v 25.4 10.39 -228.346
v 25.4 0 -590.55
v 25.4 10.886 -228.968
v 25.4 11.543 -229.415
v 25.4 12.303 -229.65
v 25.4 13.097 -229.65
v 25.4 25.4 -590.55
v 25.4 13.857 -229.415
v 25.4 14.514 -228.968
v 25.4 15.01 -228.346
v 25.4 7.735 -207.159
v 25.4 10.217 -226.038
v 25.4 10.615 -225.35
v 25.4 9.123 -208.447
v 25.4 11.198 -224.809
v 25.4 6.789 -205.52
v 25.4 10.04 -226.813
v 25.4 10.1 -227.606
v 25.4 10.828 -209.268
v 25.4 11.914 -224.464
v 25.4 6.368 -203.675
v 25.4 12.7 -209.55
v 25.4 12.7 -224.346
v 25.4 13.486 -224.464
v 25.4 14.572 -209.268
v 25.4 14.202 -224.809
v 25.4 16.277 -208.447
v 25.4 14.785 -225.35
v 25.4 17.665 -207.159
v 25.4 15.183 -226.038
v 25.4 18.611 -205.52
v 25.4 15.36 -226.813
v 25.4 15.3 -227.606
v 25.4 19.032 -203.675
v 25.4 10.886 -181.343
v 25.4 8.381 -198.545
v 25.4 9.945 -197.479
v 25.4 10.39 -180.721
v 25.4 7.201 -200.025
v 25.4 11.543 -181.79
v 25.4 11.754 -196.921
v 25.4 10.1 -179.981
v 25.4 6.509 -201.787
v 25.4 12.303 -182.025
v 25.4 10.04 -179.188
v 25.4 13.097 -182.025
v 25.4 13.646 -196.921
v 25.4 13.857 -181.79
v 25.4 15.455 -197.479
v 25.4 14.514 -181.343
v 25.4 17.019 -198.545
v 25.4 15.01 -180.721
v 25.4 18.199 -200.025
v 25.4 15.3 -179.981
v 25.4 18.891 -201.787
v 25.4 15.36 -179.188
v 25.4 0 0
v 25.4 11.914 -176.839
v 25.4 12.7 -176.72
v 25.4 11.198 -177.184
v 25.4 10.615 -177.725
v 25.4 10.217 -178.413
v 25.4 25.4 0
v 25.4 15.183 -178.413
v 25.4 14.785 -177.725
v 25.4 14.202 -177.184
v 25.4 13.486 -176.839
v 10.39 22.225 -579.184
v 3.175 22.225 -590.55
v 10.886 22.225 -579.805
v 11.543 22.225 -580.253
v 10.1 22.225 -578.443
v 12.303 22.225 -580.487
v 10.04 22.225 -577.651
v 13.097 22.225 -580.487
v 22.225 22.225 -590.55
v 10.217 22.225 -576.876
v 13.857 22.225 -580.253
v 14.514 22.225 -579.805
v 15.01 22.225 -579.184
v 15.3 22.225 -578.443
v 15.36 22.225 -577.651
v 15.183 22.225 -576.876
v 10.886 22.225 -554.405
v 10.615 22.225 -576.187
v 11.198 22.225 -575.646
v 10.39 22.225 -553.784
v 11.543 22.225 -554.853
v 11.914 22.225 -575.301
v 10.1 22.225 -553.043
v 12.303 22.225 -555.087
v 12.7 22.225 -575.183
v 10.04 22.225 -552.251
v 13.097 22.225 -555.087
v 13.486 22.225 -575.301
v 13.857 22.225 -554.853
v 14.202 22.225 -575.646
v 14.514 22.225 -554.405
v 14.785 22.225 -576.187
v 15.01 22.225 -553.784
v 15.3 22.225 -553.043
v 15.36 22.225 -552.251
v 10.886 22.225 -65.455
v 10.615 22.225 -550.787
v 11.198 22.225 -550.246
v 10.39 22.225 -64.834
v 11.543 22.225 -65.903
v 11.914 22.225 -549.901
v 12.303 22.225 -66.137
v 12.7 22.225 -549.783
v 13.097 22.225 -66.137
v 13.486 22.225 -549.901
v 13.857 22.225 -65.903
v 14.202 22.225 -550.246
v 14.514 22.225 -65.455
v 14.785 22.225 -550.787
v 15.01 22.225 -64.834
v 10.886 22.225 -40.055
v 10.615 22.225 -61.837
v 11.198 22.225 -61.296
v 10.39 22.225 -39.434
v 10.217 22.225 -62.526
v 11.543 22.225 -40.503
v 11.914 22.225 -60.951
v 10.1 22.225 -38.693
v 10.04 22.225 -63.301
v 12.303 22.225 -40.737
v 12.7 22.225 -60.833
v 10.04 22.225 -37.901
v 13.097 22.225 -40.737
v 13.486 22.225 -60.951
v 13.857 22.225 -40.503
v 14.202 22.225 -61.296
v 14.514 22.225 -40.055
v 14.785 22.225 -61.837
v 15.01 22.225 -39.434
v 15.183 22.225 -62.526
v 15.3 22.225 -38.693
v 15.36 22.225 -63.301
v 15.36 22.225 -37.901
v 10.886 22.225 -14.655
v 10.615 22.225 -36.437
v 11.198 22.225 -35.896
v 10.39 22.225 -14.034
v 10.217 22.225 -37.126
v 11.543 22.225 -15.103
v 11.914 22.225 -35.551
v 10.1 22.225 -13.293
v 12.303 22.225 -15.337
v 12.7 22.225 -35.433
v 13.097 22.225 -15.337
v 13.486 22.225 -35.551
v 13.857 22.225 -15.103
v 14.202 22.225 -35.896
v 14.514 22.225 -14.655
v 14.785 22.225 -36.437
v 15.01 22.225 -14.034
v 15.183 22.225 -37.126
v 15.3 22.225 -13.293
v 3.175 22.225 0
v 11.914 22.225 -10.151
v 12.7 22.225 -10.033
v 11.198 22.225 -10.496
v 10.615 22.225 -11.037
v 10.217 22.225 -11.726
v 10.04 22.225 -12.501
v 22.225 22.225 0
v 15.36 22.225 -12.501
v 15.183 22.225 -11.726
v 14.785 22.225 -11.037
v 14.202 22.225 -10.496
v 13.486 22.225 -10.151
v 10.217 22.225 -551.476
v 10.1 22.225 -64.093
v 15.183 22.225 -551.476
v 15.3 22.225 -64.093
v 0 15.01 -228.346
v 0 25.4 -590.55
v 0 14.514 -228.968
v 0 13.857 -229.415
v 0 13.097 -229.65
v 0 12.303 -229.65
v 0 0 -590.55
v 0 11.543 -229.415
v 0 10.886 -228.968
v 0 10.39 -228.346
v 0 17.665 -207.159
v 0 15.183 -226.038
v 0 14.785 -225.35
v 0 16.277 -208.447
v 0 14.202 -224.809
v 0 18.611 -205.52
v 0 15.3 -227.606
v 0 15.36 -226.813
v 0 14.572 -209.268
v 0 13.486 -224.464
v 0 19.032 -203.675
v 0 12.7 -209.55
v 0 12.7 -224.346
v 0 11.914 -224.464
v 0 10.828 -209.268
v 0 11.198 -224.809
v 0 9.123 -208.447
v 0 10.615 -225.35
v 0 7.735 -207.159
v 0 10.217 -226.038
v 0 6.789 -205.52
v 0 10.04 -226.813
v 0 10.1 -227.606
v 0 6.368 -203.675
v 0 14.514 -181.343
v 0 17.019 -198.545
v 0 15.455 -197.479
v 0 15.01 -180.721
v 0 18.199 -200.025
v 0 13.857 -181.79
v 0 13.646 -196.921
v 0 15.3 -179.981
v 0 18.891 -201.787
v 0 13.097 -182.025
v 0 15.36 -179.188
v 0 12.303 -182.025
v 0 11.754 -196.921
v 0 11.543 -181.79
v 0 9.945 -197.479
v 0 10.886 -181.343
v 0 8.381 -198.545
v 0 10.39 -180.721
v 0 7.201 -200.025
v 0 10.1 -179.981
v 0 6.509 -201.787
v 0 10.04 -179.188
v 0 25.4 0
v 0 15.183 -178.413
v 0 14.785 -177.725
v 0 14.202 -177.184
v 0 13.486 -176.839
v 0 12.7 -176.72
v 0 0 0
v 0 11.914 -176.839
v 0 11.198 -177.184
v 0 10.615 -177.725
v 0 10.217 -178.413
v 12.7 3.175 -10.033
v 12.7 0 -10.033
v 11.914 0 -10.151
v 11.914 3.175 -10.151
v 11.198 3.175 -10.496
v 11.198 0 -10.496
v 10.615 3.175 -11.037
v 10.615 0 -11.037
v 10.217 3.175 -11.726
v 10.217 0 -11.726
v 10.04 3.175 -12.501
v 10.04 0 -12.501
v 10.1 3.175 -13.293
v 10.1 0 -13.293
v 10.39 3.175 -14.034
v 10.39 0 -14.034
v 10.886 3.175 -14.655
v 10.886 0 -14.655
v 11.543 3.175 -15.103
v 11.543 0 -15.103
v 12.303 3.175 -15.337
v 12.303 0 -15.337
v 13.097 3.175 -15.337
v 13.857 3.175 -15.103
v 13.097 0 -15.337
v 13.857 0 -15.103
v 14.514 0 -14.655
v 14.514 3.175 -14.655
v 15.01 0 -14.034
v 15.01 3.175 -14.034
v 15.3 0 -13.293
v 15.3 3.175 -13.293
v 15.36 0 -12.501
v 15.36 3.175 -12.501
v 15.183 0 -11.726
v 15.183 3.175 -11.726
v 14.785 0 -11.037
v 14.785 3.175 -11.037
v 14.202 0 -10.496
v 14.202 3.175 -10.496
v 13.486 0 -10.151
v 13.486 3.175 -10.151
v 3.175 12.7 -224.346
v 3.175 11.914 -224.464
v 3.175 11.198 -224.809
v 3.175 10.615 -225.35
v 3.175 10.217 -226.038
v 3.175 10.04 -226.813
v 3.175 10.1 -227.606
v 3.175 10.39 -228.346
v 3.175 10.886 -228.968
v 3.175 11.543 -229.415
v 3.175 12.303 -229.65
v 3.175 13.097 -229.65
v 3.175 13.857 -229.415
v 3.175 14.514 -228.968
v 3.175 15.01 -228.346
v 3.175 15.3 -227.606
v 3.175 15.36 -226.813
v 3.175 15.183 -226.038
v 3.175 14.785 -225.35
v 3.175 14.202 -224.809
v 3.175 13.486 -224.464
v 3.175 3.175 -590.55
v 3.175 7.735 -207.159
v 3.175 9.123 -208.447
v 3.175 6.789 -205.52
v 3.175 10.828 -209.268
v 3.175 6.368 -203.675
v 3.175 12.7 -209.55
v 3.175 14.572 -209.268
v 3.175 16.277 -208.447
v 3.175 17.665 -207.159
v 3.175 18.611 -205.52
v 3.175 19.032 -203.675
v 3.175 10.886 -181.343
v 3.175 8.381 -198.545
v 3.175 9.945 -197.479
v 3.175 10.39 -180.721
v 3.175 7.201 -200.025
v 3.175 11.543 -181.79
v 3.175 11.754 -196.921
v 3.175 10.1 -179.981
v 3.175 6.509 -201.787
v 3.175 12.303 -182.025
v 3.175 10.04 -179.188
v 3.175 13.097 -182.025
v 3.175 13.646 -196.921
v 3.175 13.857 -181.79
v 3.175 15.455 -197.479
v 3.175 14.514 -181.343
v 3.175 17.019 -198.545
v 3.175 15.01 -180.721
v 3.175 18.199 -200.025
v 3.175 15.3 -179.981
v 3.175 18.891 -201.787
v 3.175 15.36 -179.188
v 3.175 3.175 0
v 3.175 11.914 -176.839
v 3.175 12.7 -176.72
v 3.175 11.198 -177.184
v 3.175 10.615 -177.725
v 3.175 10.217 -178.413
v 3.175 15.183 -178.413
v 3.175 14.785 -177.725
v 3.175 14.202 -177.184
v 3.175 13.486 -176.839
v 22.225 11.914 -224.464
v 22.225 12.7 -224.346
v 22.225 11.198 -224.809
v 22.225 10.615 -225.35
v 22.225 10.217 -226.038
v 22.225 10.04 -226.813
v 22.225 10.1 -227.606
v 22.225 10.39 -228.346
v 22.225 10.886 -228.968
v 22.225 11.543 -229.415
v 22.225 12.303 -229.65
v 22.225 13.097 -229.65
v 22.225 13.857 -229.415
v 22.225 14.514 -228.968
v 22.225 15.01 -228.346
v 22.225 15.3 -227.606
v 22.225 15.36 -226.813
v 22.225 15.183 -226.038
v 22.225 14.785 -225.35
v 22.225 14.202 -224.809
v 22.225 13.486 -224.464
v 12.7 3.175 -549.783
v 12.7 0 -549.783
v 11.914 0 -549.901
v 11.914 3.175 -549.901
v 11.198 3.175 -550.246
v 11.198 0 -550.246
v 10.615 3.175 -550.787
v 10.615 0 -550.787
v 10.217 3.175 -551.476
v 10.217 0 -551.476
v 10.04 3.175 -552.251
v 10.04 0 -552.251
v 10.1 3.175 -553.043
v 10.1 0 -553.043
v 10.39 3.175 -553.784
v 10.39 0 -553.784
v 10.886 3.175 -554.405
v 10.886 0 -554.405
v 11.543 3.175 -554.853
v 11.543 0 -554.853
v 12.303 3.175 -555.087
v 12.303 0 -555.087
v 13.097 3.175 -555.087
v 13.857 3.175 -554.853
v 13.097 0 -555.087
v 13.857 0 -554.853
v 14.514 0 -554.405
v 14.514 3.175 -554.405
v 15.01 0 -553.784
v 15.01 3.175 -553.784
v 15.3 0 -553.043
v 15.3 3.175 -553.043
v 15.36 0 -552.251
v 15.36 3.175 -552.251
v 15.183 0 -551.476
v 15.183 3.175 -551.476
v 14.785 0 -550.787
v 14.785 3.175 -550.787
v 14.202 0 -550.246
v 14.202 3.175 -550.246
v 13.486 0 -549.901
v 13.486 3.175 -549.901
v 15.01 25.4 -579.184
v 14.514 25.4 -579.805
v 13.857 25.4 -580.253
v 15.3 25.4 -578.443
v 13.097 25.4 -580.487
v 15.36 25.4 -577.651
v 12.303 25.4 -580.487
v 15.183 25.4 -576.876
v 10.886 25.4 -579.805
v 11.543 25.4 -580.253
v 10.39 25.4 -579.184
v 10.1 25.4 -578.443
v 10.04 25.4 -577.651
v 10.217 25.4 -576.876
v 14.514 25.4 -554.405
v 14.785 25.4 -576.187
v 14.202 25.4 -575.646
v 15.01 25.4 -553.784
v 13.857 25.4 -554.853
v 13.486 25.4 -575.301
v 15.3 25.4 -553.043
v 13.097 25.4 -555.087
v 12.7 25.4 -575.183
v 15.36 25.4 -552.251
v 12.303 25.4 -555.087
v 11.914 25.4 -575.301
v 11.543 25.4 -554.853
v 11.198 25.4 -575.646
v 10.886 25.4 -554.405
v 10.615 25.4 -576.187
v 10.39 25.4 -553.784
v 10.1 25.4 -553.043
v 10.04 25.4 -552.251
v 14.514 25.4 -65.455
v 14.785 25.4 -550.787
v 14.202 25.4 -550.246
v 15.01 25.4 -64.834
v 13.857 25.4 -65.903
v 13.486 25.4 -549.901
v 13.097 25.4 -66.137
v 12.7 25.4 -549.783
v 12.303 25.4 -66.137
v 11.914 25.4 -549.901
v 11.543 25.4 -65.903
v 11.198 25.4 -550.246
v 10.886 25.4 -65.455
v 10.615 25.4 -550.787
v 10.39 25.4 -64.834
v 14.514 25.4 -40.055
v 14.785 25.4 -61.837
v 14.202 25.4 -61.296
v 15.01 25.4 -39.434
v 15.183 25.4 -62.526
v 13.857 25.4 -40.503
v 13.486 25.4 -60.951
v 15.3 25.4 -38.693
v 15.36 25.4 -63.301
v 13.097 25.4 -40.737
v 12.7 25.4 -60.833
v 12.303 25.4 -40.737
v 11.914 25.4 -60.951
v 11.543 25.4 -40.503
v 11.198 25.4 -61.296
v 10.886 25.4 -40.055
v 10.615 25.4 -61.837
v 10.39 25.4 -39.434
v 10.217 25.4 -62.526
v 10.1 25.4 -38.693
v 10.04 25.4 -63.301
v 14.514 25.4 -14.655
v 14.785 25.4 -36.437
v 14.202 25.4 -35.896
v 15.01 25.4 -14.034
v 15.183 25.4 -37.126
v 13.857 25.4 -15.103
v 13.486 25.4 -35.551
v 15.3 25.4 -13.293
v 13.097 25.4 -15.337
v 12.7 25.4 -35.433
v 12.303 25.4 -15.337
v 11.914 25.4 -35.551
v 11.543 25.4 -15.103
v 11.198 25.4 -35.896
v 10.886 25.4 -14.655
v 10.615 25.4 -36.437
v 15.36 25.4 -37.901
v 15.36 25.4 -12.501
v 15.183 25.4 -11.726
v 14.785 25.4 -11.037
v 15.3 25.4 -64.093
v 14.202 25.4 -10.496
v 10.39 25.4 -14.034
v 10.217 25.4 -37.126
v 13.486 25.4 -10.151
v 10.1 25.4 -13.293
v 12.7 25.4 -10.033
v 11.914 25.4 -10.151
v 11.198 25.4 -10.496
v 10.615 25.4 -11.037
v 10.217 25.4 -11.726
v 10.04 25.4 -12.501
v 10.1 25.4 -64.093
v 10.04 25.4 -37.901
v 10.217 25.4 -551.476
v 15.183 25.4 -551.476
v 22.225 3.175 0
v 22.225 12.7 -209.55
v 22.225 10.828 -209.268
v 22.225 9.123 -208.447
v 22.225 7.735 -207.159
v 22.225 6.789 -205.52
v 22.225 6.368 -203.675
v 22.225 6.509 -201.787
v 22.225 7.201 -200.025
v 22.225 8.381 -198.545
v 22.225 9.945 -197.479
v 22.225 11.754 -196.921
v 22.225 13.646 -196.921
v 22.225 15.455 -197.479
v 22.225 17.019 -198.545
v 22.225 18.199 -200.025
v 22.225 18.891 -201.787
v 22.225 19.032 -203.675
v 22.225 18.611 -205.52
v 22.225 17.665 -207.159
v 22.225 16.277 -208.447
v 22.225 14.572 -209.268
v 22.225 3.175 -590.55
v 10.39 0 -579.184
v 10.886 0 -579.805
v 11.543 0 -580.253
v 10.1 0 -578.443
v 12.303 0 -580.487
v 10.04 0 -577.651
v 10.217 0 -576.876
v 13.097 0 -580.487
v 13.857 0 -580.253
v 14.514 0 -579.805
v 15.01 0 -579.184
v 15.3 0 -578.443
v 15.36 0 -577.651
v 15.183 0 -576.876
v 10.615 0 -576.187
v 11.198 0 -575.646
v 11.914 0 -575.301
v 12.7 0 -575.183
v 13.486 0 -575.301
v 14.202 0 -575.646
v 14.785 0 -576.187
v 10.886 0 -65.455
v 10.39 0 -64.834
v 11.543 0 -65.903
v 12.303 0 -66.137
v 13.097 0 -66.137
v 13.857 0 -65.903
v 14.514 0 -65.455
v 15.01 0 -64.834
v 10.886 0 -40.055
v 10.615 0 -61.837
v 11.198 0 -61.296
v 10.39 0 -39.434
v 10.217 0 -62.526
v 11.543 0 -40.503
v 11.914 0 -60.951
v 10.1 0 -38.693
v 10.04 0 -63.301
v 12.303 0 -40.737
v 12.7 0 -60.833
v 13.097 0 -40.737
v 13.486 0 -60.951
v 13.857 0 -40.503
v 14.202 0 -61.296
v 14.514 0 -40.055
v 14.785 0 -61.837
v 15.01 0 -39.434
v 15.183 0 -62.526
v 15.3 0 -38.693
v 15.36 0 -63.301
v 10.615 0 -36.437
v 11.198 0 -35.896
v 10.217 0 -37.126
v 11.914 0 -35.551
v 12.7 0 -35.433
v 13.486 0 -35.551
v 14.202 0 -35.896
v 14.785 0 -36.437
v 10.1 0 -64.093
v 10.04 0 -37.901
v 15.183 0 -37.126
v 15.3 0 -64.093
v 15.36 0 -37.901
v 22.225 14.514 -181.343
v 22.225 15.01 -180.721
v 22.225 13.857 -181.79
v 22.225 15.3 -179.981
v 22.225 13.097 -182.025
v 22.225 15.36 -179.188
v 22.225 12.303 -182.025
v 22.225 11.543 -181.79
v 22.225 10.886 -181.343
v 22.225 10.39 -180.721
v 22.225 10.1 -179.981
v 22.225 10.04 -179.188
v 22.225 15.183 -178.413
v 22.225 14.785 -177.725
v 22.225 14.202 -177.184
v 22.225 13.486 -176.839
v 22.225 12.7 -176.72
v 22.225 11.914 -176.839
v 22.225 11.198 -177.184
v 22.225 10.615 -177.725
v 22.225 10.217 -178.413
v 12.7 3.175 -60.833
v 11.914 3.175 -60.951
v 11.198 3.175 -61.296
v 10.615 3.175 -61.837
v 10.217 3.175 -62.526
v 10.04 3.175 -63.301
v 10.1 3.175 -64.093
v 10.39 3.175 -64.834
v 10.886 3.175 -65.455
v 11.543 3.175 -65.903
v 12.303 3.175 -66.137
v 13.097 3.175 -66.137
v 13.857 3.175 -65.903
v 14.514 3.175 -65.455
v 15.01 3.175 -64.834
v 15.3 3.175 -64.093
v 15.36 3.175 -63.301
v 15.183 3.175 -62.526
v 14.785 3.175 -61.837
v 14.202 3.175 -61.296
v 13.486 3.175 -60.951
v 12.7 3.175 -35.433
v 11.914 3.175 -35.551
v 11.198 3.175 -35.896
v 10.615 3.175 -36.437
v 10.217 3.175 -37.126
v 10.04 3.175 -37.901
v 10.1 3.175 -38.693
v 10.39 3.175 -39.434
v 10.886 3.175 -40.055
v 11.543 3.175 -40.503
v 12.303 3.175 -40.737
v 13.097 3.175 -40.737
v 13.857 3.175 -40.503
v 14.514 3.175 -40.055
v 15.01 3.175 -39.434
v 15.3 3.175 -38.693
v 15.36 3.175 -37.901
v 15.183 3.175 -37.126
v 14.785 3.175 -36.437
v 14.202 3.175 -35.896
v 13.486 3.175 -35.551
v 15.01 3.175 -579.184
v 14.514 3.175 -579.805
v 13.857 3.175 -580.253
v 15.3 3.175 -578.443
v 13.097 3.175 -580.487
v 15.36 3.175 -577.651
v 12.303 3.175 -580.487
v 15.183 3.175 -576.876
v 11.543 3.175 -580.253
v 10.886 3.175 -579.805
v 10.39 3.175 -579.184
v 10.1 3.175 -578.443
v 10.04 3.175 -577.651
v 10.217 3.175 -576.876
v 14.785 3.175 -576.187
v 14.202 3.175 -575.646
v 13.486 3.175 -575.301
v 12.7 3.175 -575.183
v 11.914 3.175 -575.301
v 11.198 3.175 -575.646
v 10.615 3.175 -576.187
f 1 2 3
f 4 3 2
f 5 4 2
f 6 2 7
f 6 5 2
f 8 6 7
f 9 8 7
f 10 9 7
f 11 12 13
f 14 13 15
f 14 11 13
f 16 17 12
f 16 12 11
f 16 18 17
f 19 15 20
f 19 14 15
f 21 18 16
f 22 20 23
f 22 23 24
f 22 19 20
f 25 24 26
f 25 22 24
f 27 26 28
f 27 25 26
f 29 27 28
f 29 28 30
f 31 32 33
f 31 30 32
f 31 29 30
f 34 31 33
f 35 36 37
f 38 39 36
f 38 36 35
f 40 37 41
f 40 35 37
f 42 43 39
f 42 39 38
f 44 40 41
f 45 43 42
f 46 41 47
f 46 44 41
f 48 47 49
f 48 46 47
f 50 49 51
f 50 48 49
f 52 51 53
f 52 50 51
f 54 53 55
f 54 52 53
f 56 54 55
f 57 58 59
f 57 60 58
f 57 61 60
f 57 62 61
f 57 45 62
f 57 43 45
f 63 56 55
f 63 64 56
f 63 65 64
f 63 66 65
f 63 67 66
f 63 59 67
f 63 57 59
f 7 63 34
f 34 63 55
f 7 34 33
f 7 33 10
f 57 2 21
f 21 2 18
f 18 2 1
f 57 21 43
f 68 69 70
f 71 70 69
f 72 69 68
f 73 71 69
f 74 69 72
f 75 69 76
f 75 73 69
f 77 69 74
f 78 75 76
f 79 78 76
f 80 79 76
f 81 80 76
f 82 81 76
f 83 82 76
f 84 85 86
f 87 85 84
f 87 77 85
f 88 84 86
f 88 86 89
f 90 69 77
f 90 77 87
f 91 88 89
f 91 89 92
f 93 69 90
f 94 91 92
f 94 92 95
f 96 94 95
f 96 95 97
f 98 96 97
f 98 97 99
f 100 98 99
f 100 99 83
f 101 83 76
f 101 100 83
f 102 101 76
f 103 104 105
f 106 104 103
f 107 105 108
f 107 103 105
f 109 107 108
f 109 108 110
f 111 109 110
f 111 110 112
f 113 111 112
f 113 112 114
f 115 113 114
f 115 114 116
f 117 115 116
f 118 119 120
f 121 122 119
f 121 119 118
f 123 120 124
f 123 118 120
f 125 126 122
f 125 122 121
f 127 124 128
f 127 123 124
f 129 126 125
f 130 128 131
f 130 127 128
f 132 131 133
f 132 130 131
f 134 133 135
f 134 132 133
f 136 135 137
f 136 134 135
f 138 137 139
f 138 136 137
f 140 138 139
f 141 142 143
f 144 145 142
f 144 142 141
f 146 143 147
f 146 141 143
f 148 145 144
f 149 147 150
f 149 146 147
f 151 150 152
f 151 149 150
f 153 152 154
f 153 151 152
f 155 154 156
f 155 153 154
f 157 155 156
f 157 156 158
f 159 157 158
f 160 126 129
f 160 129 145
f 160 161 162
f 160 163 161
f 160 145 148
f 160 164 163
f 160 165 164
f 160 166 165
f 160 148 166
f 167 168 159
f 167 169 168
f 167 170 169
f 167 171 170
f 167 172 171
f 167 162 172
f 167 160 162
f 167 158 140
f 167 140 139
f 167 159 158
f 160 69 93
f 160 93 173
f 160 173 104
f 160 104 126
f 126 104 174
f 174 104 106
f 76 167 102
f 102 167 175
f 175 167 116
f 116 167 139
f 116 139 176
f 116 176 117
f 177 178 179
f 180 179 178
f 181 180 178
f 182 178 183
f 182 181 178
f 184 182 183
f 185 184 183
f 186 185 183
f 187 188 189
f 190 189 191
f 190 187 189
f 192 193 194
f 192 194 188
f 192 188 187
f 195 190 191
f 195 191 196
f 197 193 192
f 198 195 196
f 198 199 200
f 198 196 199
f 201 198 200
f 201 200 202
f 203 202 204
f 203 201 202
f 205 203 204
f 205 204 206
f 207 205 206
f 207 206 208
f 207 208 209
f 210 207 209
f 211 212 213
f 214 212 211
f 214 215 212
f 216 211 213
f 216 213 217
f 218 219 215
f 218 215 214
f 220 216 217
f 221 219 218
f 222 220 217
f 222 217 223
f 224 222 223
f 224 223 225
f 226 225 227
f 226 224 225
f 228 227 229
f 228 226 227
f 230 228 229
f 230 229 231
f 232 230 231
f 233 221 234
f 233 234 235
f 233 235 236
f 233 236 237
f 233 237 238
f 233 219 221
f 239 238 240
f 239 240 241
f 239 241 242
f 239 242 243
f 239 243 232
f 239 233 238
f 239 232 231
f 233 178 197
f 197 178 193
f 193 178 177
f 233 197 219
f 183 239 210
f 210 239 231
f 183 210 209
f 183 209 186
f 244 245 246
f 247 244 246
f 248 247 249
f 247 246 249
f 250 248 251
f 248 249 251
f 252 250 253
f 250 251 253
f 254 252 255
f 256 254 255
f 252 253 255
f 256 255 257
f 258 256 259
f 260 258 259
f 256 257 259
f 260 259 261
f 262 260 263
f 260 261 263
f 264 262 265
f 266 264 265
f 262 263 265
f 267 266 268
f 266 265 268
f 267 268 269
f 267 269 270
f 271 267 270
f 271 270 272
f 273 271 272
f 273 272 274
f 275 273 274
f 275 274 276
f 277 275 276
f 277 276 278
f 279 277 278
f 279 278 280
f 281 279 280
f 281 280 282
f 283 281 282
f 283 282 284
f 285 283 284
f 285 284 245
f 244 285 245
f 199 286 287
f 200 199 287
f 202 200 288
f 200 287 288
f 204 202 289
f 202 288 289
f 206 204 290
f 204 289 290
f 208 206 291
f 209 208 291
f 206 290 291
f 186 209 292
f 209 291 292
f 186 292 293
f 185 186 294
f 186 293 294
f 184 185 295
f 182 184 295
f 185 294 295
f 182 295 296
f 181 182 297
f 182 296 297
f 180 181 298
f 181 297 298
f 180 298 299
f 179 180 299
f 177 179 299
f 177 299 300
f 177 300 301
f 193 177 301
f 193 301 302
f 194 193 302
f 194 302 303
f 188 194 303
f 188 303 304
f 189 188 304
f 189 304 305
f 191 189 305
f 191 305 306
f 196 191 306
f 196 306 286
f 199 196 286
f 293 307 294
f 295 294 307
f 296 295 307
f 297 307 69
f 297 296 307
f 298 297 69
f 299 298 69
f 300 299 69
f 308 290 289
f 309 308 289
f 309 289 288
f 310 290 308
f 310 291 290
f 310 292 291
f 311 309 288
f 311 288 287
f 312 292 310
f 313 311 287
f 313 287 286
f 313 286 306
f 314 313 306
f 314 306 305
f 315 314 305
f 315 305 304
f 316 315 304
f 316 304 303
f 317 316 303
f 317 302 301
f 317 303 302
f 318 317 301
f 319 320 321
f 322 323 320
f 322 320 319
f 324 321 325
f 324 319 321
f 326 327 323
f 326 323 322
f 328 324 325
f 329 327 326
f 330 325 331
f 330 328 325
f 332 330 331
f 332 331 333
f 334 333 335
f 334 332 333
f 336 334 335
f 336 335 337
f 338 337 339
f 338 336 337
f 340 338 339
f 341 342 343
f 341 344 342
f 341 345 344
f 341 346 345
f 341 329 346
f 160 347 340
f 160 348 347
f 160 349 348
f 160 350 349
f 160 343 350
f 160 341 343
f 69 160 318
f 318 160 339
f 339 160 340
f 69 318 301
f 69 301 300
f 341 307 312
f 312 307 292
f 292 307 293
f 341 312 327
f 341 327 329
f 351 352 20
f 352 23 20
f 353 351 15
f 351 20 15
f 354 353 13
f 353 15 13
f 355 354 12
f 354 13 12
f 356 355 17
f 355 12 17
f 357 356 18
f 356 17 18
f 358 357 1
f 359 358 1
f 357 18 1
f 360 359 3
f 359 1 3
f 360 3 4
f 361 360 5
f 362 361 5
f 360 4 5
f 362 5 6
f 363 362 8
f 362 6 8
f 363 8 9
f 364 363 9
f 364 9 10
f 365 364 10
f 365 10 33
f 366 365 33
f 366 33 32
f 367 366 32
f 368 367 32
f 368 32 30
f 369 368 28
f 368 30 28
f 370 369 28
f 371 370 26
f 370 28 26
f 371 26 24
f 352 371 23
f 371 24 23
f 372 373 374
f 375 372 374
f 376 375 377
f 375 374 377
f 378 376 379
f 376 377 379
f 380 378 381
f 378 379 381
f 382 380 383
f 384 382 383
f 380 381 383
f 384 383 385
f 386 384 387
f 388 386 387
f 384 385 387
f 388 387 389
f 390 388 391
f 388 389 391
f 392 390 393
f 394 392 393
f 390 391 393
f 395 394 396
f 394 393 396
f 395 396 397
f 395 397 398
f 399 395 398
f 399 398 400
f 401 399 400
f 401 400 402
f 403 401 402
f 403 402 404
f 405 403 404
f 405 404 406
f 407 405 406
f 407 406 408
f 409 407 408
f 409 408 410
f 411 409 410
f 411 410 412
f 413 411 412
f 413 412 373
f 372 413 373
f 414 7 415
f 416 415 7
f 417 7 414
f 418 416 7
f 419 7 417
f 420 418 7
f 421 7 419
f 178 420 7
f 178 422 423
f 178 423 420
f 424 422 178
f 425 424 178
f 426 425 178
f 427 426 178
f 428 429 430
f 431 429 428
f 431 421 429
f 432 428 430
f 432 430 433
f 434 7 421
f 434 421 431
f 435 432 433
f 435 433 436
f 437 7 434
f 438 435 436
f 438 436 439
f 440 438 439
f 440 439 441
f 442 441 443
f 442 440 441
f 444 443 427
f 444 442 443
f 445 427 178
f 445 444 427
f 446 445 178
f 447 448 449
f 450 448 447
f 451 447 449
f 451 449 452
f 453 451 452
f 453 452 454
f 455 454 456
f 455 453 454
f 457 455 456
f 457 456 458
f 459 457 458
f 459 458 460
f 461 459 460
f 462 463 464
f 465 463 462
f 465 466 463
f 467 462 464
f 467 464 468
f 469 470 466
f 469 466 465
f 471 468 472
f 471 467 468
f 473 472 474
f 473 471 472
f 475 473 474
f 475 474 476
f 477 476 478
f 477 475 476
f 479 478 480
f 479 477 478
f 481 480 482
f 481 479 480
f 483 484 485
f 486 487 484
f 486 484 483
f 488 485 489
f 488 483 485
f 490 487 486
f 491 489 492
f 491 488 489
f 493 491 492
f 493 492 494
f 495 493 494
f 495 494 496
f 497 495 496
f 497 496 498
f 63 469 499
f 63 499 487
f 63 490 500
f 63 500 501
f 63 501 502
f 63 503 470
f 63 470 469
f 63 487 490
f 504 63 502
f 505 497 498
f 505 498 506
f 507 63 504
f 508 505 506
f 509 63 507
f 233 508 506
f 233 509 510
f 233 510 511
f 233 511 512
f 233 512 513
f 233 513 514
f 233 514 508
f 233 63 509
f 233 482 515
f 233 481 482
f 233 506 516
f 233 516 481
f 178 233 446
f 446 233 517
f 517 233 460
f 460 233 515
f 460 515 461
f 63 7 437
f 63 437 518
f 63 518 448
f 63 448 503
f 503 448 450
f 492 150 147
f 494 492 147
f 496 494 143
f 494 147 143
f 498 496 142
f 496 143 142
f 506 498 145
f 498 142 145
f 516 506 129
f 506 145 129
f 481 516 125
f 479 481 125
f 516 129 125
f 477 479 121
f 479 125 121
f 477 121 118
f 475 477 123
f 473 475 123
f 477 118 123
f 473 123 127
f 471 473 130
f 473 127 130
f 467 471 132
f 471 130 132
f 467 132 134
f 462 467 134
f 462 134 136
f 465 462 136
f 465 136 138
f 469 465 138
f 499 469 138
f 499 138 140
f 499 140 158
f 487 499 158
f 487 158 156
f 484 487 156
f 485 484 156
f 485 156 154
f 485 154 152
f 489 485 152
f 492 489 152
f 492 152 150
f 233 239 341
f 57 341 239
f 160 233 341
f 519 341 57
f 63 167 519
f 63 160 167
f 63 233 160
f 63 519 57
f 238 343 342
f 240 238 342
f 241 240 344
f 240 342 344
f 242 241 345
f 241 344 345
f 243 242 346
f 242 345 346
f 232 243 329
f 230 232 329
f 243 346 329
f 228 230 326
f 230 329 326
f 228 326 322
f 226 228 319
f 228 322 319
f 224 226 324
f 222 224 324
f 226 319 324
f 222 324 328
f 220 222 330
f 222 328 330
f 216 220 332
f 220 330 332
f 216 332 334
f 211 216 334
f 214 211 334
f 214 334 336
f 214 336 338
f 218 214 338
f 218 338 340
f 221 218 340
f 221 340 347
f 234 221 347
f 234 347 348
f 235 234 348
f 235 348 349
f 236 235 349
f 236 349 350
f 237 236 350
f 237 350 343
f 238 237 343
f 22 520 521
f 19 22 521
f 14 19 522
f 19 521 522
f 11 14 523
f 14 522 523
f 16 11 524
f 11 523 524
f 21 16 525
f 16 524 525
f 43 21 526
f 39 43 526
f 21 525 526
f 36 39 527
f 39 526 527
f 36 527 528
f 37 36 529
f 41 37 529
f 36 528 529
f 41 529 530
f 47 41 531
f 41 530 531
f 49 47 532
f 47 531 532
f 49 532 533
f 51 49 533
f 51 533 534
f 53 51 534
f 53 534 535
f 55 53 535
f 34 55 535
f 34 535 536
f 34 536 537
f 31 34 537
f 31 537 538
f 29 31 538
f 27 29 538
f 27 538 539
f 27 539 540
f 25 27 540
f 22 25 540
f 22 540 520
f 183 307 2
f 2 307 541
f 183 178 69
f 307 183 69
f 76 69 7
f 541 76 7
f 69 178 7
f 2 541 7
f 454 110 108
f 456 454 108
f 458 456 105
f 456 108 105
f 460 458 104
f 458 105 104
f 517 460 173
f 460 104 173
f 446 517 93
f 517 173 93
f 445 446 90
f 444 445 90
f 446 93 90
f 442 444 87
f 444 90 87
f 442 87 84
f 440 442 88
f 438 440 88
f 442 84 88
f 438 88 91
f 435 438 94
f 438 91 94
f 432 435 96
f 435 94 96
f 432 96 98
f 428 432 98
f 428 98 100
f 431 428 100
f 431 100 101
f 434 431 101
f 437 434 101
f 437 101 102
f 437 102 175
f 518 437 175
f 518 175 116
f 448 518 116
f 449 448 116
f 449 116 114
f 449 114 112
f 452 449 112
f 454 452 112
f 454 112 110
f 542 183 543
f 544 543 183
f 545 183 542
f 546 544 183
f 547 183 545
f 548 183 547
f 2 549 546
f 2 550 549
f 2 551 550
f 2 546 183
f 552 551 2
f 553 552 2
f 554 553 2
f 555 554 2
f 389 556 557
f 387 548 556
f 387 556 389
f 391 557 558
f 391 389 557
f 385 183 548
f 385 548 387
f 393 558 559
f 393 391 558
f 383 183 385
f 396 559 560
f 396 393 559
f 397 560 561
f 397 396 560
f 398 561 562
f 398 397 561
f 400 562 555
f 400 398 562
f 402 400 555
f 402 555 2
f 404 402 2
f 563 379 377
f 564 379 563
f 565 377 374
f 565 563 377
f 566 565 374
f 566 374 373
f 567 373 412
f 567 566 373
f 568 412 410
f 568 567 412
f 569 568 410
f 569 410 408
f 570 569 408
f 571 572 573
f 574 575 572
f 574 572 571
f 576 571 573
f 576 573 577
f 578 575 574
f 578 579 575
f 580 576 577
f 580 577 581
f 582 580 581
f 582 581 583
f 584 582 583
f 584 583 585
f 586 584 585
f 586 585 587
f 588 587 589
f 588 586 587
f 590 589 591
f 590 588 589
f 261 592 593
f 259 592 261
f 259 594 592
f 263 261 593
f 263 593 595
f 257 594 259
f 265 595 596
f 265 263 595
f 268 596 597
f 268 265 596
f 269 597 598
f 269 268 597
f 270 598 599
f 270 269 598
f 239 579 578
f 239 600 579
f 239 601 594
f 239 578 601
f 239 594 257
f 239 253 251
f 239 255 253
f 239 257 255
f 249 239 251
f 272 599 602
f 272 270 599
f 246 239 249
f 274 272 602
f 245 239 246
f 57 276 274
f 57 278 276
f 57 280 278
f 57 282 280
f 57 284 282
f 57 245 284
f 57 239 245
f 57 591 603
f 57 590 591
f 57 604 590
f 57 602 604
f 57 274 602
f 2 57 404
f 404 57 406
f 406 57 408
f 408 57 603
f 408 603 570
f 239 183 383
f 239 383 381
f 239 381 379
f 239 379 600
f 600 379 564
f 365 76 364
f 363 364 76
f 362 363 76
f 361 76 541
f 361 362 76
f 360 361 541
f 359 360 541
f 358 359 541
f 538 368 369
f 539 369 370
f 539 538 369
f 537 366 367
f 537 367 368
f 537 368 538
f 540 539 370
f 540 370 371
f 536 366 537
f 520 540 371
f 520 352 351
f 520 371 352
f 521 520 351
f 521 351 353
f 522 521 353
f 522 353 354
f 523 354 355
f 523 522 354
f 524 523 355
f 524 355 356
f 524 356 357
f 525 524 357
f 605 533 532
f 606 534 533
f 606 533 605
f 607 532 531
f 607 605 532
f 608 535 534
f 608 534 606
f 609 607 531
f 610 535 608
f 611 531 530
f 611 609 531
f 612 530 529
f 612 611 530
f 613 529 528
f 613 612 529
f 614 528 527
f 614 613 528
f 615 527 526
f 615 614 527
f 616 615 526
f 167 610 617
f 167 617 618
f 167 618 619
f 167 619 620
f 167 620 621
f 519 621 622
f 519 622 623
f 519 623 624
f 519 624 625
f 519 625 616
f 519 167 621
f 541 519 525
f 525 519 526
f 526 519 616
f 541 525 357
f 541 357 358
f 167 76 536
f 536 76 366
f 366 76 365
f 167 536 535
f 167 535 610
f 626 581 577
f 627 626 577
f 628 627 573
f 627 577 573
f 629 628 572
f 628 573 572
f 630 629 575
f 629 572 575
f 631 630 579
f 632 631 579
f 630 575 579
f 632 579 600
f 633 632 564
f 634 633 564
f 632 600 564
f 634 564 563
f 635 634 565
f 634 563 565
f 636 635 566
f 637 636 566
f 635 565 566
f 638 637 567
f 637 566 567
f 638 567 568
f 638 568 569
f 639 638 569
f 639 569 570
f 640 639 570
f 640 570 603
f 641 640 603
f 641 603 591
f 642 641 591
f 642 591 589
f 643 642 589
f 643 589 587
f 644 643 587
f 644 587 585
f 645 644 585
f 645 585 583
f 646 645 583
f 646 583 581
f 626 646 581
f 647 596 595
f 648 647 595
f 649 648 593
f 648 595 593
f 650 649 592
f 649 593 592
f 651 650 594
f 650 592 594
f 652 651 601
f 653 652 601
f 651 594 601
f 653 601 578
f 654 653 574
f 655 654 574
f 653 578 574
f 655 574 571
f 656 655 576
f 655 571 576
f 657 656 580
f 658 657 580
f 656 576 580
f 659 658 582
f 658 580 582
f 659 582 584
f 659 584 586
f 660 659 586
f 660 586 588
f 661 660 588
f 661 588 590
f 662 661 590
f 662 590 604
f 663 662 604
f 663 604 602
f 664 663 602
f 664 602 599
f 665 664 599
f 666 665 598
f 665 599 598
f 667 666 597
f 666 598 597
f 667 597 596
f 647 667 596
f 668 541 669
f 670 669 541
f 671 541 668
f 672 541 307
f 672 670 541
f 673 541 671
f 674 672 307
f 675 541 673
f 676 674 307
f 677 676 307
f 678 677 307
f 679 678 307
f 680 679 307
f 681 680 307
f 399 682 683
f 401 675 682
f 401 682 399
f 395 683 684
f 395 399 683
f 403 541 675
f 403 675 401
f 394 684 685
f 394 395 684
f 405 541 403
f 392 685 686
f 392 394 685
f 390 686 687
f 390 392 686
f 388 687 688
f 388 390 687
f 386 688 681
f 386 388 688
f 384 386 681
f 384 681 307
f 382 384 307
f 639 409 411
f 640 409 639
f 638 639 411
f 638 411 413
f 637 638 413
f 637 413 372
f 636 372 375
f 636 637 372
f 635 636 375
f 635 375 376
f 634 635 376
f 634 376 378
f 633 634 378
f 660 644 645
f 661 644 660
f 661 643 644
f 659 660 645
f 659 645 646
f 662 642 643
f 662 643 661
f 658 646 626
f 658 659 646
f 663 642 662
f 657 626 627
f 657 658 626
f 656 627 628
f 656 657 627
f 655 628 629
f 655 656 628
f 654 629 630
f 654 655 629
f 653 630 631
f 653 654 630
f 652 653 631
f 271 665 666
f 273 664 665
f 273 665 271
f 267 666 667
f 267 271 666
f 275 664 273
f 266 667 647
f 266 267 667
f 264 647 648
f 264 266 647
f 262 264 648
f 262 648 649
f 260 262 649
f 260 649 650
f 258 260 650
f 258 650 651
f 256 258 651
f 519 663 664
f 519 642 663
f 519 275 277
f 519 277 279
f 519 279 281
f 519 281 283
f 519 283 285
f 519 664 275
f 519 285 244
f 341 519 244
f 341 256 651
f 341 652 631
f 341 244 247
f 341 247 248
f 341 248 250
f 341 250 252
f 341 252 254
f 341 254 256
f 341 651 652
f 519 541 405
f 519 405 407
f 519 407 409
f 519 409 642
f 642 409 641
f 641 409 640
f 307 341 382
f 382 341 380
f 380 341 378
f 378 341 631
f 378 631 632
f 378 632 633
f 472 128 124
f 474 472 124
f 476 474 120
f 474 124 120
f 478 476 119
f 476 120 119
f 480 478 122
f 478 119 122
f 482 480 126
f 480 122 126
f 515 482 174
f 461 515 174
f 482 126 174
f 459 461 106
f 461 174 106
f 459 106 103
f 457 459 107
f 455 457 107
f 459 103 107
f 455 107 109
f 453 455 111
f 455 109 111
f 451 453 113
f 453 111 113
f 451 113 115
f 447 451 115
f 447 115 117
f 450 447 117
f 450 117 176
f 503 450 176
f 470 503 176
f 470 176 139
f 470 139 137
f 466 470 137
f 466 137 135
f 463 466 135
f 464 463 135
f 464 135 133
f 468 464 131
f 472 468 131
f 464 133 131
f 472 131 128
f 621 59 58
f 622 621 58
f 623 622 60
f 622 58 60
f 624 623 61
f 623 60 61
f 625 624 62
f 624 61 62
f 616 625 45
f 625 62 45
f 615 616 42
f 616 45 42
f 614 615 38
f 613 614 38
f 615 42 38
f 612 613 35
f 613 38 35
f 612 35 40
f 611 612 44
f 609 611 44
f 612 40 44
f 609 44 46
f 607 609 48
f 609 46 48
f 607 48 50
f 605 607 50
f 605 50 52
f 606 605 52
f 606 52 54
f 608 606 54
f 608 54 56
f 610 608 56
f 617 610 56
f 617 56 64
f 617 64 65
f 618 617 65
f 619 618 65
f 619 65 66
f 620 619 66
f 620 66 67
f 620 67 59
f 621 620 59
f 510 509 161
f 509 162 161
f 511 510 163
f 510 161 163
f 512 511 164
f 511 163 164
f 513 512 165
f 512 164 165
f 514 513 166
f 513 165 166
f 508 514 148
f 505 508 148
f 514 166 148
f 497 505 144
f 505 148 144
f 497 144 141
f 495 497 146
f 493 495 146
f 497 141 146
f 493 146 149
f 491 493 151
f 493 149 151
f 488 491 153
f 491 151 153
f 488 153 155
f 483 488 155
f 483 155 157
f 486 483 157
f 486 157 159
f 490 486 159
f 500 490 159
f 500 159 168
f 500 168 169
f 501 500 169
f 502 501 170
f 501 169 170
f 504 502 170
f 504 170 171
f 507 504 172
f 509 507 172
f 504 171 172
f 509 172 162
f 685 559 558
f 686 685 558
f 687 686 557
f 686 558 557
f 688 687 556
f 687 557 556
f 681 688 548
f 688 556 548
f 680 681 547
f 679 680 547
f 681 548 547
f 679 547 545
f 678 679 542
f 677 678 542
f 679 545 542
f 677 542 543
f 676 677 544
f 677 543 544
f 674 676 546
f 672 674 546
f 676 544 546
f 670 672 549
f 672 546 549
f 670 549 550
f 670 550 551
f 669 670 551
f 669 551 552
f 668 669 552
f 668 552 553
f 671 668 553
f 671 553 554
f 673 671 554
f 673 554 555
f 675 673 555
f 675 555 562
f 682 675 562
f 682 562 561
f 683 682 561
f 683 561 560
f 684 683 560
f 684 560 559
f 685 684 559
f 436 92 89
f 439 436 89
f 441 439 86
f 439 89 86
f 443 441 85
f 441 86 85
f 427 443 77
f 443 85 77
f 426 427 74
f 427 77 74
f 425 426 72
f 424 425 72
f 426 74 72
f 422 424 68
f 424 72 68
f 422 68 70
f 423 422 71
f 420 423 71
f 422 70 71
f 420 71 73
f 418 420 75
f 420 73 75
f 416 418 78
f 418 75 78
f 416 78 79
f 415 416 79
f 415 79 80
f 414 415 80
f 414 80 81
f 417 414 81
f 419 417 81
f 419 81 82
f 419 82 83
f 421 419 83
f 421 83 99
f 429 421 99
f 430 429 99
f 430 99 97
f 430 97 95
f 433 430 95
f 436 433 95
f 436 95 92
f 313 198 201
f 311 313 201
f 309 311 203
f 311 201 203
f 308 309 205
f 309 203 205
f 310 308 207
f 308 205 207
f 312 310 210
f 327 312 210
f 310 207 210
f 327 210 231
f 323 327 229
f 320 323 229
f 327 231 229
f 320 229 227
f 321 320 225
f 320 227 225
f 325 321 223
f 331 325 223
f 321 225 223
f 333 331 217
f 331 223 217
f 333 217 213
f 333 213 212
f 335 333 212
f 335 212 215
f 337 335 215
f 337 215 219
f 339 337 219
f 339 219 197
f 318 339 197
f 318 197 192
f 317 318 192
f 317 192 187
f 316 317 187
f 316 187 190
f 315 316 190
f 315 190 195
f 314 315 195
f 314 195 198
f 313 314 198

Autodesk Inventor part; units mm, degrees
ref_plane "YZ Plane" through (0, 0, 0) normal (1, 0, 0) x (0, 1, 0)
ref_plane "XZ Plane" through (0, 0, 0) normal (0, 1, 0) x (-1, 0, 0)
ref_plane "XY Plane" through (0, 0, 0) normal (0, 0, 1) x (1, 0, 0)
sketch "Sketch1" plane through (0, 0, 0) normal (0, 0, 1) x (1, 0, 0)
  line L0 (0, 0) -> (25.4, 0)
  line L1 (25.4, 0) -> (25.4, 25.4)
  line L2 (25.4, 25.4) -> (0, 25.4)
  line L3 (0, 25.4) -> (0, 0)
  line L4 (3.175, 22.225) -> (22.225, 22.225)
  line L5 (22.225, 22.225) -> (22.225, 3.175)
  line L6 (22.225, 3.175) -> (3.175, 3.175)
  line L7 (3.175, 3.175) -> (3.175, 22.225)
  dimension "d0" = 25.4
  dimension "d1" = 25.4
  dimension "d2" = 3.175
extrude "Extrusion1" add sketch "Sketch1" against normal blind 590.55
sketch "Sketch3" plane through (25.4, 0, 0) normal (1, 0, 0) x (0, 0, -1)
  line L0 (0, 0) -> (0, 25.4) projected
  point P0 (203.2, 12.7)
  dimension "d14" = 203.2
hole "Hole2" at (25.4, 12.7, -203.2) direction (-1, 0, 0) diameter 12.7 depth 25.4 tip angle 118
sketch "Sketch4" plane through (0, 0, 0) normal (-1, 0, 0) x (0, 0, 1)
  circle A0 centre (-203.2, 12.7) radius 6.35 projected
  point P0 (-179.3875, 12.7)
  point P1 (-227.0125, 12.7)
  dimension "d23" = 23.8125
  dimension "d24" = 23.8125
hole "Hole3" at (0, 12.7, -179.3875) at (0, 12.7, -227.0125) direction (1, 0, 0) diameter 5.334 depth 25.4 tip angle 118
sketch "Sketch5" plane through (0, 25.4, 0) normal (0, 1, 0) x (1, 0, 0)
  line L0 (25.4, 590.55) -> (0, 590.55) projected
  line L1 (25.4, 0) -> (0, 0) projected
  point P0 (12.7, 12.7)
  point P1 (12.7, 38.1)
  point P2 (12.7, 63.5)
  point P3 (12.7, 577.85)
  point P4 (12.7, 552.45)
  dimension "d32" = 12.7
  dimension "d33" = 25.4
  dimension "d34" = 12.7
  dimension "d35" = 25.4
  dimension "d36" = 25.4
hole "Hole4" at (12.7, 25.4, -12.7) at (12.7, 25.4, -38.1) at (12.7, 25.4, -63.5) at (12.7, 25.4, -577.85) at (12.7, 25.4, -552.45) direction (0, -1, 0) diameter 5.334 depth 25.4 tip angle 118
properties part number "new vertical kicker thingleft"
